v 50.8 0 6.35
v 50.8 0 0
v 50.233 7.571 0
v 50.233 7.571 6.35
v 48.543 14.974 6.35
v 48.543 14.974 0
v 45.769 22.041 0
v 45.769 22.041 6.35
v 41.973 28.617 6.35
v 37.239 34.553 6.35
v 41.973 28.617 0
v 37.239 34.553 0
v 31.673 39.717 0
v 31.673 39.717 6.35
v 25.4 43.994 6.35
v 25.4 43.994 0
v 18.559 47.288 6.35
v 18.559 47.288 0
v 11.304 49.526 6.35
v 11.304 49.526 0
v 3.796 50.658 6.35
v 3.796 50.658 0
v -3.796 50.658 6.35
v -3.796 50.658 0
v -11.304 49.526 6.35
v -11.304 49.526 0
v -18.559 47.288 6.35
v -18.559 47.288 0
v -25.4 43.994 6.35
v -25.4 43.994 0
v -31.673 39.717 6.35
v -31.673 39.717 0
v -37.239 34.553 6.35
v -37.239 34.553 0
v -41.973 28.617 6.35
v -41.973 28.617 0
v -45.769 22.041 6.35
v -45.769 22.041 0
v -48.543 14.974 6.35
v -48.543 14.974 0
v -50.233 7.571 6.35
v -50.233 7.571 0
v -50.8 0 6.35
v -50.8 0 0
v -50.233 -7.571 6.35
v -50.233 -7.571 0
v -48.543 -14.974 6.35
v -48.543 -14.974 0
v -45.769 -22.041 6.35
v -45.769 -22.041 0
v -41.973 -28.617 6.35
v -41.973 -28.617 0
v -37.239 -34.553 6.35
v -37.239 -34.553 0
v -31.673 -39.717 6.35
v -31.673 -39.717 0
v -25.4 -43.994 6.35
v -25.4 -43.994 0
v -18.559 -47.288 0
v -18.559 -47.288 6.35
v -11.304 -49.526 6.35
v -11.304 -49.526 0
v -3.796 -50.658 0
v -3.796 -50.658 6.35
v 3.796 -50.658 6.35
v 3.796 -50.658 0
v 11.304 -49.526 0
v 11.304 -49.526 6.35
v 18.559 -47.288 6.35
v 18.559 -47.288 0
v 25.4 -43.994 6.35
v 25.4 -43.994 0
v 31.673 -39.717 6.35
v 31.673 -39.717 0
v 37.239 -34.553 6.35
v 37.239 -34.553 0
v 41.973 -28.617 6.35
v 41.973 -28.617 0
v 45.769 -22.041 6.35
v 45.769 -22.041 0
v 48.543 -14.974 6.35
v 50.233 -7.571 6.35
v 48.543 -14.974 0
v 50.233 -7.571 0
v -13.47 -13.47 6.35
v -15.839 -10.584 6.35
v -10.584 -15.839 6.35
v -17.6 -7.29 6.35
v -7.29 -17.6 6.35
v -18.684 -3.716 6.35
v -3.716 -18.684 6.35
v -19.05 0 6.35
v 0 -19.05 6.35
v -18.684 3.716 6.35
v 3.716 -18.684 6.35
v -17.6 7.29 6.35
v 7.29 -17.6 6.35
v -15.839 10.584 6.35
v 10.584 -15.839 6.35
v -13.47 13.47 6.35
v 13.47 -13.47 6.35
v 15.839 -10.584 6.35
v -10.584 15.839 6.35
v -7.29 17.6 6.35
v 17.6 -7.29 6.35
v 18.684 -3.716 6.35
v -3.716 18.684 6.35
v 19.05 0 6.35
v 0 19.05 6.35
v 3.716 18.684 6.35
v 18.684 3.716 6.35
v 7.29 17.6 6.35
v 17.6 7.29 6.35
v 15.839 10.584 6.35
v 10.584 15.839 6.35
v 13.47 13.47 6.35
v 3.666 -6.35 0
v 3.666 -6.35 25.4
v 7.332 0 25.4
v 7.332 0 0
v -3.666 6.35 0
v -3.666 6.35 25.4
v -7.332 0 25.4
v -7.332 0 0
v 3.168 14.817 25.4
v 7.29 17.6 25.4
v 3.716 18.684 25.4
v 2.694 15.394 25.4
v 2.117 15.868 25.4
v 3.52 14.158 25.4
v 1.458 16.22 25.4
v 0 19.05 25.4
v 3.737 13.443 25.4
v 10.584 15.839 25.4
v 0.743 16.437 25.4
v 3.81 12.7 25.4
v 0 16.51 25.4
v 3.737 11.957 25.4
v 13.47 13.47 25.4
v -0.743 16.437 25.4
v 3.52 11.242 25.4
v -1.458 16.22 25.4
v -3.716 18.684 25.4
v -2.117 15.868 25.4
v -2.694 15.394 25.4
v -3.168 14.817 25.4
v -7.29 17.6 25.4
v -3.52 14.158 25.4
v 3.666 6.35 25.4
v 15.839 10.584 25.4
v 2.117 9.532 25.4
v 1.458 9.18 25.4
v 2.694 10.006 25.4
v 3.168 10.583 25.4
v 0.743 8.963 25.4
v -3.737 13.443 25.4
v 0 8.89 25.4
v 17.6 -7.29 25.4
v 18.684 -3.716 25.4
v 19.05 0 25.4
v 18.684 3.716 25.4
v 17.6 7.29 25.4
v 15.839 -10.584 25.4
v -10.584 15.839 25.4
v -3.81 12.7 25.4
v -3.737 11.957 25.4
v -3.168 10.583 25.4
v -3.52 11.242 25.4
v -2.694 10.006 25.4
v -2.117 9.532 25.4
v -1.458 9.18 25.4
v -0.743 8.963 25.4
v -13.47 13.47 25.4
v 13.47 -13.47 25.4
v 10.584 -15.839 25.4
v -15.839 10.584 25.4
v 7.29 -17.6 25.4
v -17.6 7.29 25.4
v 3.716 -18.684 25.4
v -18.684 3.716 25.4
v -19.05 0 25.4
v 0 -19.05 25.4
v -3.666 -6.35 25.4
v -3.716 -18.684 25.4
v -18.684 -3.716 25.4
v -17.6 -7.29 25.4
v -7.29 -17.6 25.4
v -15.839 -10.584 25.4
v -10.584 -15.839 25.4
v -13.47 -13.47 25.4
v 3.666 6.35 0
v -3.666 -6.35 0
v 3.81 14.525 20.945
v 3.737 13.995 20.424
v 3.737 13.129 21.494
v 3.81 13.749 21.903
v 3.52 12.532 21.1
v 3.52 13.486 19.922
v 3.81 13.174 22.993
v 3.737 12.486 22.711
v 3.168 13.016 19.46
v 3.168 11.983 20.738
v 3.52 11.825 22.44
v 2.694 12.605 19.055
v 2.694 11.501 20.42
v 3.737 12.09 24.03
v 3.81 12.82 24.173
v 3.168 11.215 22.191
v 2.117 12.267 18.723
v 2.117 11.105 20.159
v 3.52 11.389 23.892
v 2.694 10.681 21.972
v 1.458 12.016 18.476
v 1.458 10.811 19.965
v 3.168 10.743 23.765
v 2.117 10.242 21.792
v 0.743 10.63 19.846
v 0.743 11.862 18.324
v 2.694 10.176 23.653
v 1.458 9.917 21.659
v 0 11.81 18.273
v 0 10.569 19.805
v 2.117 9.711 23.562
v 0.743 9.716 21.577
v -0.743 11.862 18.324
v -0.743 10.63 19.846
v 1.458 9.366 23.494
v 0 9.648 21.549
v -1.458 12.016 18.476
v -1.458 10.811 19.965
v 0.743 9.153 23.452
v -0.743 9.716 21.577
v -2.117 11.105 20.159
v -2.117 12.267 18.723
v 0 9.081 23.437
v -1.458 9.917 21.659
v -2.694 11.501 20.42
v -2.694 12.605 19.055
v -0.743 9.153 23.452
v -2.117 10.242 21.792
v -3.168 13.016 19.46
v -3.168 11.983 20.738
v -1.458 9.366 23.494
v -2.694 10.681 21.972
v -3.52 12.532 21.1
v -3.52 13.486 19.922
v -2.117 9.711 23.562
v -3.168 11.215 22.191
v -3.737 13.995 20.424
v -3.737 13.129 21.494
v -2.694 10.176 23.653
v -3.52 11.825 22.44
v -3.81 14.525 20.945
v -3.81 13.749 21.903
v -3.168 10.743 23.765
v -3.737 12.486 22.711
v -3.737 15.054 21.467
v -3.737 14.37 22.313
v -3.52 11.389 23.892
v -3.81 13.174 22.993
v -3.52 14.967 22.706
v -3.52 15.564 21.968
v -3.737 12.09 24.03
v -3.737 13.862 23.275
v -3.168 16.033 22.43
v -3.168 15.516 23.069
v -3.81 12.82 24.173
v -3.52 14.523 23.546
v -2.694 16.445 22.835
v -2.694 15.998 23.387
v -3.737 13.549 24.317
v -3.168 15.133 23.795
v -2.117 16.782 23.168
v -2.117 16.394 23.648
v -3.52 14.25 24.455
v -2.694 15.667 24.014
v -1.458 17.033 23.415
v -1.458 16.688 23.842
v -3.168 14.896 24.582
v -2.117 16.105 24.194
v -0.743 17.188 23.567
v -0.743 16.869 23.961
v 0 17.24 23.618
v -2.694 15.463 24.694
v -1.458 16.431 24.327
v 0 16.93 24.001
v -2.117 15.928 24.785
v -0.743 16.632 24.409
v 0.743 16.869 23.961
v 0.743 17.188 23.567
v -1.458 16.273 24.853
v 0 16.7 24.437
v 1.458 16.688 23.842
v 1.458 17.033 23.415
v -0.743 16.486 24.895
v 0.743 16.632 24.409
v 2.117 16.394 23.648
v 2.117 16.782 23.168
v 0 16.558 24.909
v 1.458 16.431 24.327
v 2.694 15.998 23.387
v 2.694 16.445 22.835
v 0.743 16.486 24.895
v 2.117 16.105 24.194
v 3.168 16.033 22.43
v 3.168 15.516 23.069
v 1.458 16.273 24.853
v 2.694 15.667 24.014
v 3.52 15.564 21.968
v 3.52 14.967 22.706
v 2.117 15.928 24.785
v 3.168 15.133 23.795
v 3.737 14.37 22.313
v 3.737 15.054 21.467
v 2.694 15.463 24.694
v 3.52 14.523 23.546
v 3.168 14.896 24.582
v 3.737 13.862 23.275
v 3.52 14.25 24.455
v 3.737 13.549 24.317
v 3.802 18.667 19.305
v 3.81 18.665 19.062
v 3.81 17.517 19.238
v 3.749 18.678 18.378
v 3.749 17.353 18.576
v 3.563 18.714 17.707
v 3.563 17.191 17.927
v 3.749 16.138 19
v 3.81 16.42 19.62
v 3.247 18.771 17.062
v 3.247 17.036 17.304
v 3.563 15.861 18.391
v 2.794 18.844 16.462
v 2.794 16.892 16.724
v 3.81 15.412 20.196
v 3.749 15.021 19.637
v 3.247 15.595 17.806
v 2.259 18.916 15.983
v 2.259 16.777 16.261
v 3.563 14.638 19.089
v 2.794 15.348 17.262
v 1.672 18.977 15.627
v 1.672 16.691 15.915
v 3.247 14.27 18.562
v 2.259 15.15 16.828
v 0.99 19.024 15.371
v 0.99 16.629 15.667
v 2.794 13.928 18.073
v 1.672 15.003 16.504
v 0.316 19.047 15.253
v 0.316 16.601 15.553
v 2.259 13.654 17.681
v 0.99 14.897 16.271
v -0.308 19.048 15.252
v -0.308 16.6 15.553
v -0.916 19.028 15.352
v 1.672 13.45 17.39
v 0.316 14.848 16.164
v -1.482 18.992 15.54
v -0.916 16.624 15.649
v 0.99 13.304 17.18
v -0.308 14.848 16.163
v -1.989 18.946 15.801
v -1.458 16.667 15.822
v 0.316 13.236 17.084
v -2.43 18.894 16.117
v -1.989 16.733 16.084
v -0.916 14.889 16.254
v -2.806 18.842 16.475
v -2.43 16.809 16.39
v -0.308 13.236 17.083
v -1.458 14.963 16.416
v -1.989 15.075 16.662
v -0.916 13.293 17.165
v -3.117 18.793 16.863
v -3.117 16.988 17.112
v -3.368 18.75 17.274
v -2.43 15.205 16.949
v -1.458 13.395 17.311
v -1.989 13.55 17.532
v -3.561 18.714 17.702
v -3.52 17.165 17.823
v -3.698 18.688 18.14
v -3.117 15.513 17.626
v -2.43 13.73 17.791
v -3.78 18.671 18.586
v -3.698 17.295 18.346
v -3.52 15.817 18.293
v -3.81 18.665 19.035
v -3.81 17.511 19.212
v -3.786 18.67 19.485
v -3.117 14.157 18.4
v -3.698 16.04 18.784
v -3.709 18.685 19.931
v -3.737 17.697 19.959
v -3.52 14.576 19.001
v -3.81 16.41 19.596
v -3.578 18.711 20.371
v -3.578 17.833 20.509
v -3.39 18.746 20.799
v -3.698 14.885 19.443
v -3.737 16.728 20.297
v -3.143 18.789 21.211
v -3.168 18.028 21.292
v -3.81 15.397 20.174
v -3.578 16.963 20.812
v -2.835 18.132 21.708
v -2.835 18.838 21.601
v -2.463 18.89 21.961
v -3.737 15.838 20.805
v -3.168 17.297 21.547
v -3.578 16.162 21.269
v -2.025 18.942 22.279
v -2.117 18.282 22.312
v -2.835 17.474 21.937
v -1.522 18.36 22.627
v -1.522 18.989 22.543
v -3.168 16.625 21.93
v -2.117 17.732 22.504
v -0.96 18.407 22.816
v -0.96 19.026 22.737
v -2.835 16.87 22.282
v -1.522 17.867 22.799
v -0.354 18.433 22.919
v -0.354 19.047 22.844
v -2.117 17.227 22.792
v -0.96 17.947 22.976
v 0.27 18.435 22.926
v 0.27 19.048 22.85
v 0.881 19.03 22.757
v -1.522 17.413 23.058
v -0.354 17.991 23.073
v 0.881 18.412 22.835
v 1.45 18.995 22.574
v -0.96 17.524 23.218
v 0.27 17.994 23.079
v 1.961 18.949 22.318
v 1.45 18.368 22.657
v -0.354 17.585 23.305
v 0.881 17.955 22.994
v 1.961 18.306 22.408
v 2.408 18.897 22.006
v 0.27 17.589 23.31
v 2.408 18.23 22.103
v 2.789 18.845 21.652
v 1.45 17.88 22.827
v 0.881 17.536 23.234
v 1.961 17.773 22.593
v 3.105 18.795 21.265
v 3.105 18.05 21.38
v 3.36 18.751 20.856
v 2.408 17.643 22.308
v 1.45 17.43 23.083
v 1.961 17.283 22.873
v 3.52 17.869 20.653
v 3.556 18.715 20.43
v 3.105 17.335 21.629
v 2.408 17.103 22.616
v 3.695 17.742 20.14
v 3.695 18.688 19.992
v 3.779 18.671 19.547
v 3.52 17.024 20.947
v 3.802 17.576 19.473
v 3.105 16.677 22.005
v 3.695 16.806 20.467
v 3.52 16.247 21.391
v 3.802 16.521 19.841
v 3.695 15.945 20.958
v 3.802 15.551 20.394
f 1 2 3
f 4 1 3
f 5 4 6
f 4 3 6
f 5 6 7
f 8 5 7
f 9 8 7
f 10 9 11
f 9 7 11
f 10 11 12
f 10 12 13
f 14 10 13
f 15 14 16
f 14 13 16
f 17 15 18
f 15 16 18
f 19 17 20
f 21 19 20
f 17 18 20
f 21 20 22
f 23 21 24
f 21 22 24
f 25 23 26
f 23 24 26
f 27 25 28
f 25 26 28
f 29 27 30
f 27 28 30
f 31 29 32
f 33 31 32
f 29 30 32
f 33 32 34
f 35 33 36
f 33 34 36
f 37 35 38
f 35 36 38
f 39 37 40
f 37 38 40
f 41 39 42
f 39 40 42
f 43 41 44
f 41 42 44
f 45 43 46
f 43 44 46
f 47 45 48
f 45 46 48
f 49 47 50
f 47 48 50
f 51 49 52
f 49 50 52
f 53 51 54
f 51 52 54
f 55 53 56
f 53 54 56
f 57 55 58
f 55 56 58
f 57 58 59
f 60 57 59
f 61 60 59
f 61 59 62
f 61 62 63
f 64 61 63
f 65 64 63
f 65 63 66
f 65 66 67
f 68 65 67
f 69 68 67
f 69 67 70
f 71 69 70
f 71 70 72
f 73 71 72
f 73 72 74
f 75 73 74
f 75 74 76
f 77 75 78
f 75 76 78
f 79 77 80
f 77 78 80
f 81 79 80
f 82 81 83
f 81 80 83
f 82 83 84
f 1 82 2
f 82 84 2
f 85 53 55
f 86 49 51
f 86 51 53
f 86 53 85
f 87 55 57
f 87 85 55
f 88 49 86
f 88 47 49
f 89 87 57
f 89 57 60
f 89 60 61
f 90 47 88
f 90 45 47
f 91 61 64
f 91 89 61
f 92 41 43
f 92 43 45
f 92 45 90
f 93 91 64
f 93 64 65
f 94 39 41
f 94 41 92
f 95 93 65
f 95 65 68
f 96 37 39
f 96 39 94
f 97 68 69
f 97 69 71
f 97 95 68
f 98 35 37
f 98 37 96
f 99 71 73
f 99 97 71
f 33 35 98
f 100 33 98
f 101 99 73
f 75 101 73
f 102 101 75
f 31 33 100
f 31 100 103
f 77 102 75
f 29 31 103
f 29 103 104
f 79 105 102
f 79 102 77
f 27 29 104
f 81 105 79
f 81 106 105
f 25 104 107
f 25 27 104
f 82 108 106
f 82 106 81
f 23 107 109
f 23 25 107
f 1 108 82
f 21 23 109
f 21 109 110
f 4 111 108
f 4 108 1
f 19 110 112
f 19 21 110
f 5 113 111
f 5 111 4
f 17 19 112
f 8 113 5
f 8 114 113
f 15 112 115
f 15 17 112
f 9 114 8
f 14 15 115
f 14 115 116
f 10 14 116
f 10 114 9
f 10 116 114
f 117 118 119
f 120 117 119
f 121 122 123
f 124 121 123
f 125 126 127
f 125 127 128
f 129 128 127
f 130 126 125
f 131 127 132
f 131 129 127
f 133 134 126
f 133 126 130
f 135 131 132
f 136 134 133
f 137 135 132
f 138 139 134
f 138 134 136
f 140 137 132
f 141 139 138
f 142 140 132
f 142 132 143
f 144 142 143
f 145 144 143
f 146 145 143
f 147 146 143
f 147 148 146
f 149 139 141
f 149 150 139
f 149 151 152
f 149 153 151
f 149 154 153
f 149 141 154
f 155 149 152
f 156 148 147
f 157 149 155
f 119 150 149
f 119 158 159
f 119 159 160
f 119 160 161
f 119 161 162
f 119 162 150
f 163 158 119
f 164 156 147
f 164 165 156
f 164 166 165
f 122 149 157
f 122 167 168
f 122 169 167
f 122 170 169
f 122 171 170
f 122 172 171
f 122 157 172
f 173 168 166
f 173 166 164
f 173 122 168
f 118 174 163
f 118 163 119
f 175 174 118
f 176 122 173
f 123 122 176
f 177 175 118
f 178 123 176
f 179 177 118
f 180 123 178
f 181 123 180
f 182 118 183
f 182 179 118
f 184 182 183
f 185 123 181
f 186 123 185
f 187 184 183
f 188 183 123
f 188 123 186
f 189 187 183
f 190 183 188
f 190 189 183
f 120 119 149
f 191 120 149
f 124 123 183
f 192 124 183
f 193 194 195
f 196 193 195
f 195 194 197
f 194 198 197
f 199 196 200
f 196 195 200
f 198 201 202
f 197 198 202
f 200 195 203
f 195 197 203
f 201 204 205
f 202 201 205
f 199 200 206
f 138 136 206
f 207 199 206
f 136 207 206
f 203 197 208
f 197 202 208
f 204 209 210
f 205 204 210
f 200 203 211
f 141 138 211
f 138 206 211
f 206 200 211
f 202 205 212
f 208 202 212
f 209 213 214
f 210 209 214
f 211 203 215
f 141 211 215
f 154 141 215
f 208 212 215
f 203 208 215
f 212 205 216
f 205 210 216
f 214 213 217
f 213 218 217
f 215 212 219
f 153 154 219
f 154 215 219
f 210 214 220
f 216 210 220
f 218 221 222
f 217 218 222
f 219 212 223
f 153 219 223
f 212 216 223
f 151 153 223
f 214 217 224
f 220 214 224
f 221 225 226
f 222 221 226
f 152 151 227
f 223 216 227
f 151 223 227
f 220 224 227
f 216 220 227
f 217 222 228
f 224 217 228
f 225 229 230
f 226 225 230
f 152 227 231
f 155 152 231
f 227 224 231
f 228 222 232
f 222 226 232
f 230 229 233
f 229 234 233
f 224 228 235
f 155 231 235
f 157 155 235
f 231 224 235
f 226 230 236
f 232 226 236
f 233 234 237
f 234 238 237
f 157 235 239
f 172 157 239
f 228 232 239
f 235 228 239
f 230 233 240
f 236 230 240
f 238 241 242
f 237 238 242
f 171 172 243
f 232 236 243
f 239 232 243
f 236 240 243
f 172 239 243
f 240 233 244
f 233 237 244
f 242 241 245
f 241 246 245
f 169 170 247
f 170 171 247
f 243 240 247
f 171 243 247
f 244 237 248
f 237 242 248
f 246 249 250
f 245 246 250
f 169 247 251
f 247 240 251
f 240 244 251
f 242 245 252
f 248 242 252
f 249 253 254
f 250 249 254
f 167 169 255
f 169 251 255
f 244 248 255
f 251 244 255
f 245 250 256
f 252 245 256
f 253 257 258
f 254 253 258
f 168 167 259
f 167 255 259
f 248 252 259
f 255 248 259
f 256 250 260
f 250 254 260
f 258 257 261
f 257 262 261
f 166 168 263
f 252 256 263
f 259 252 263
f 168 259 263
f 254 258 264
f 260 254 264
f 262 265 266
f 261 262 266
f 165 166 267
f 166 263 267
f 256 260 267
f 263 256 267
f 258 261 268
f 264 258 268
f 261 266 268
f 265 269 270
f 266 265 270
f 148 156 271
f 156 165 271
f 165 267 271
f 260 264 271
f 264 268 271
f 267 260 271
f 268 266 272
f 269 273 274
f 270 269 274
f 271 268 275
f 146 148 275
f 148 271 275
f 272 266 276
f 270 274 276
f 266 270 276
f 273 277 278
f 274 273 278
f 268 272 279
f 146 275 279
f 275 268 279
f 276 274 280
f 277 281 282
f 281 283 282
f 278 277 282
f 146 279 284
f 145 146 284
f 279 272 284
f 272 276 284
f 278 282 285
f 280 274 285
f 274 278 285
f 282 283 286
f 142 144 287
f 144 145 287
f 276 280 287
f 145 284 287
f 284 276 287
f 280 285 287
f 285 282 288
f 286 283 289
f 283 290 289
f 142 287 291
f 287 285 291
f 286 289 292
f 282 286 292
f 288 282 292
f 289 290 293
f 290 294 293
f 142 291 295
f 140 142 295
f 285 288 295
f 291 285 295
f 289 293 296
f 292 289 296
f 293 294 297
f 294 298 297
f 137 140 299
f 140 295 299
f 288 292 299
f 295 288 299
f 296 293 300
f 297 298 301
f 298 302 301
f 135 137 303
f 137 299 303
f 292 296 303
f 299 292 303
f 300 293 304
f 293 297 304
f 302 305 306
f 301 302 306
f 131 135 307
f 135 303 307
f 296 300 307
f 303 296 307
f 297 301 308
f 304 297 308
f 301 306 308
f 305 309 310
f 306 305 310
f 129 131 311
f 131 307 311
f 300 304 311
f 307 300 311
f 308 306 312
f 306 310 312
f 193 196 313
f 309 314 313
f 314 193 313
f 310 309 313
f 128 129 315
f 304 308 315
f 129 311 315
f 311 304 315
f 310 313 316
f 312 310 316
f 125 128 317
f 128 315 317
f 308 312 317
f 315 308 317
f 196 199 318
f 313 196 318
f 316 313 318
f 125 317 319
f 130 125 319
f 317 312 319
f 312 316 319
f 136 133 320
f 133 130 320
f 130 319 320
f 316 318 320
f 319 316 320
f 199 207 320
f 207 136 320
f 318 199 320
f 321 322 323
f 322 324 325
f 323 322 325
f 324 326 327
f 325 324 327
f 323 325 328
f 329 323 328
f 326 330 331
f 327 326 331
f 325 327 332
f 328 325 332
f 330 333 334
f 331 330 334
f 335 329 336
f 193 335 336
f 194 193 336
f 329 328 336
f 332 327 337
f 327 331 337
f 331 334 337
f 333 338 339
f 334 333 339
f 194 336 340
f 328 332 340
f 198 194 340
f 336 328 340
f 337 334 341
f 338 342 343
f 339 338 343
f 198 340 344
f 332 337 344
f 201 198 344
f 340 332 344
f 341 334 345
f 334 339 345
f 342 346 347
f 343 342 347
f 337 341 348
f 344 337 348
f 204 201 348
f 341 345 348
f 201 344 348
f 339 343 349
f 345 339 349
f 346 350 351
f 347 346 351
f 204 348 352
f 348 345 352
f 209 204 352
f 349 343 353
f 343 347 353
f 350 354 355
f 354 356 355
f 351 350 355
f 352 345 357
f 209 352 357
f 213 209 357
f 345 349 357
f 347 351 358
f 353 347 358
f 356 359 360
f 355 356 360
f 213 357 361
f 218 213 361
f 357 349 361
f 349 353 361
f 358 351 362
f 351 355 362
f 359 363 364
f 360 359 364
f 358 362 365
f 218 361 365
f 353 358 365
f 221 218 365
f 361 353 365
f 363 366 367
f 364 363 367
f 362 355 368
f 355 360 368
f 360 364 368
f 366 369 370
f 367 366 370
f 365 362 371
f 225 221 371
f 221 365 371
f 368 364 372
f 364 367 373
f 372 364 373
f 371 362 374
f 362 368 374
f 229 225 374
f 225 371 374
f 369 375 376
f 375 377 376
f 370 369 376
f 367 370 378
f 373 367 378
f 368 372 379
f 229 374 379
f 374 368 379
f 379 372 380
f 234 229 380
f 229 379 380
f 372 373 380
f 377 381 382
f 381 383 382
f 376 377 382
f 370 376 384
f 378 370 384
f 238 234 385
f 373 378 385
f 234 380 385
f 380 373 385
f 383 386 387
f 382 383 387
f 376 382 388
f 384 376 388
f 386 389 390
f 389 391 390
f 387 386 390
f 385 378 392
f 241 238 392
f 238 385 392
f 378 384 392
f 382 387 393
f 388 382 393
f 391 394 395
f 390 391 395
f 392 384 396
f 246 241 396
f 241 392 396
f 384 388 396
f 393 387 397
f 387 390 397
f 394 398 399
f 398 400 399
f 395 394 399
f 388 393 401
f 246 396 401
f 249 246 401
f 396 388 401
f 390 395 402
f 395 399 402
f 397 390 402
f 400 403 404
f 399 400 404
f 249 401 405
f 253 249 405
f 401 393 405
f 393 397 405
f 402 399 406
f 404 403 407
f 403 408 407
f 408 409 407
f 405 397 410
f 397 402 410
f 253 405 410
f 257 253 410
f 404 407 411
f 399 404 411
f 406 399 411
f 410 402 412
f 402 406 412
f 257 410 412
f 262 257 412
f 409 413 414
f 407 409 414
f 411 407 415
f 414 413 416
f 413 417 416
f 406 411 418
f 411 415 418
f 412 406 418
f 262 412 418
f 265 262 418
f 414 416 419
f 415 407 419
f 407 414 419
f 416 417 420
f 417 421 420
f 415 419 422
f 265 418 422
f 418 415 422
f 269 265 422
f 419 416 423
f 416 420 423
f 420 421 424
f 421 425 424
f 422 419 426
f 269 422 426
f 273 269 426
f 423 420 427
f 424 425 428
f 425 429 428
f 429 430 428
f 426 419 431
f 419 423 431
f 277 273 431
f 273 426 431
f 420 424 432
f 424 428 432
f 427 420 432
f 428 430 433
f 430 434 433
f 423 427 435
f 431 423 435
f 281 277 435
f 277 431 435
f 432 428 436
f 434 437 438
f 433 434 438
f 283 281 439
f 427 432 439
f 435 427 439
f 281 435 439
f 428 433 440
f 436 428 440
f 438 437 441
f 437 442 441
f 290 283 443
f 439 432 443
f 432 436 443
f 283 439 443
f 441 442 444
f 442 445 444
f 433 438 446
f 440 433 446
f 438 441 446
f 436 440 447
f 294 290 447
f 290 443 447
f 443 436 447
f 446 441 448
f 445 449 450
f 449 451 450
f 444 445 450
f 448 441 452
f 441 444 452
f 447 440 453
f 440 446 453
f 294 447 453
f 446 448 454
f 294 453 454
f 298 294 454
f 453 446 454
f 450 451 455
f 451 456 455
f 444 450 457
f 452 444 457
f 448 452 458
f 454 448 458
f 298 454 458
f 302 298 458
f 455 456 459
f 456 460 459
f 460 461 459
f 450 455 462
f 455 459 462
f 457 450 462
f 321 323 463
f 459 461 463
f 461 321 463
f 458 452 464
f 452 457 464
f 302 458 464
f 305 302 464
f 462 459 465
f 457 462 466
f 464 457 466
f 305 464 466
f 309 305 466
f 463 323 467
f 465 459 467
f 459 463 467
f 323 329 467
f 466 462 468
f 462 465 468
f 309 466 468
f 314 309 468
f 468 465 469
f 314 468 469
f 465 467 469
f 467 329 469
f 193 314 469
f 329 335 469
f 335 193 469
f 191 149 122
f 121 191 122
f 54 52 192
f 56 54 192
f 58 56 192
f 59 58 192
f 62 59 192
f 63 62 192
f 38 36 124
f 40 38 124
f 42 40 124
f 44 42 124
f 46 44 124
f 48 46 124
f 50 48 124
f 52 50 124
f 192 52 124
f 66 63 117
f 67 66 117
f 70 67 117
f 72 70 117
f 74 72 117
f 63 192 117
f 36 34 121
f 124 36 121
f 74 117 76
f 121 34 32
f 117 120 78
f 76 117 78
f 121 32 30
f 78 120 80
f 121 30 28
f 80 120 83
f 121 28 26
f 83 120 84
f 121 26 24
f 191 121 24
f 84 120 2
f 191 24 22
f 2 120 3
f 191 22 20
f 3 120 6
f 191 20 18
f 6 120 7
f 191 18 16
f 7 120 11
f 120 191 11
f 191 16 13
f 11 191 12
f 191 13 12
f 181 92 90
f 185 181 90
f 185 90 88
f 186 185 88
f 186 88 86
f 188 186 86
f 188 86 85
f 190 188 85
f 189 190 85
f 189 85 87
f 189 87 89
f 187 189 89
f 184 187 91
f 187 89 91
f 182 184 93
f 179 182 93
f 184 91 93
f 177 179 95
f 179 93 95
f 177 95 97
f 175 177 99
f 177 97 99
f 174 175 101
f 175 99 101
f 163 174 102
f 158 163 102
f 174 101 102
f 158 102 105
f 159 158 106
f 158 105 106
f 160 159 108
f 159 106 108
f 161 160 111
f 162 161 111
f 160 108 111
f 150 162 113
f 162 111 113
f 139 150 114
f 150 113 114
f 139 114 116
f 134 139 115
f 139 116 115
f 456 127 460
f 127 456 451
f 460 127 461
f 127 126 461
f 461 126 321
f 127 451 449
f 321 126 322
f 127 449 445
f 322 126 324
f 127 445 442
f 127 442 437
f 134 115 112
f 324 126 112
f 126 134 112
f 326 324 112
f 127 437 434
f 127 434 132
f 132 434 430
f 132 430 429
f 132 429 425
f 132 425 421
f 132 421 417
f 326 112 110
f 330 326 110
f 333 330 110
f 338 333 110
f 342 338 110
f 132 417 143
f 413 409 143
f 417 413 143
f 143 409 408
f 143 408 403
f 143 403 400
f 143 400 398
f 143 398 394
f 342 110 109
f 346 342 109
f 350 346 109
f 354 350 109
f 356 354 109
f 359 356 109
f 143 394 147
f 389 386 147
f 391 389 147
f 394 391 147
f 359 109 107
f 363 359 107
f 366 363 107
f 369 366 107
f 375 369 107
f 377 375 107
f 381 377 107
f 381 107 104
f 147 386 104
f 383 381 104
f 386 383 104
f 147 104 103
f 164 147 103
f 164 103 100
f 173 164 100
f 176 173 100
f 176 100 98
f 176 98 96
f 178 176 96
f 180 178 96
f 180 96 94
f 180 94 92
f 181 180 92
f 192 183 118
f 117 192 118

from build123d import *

# Parameters (mm, degrees)
SKETCH1_R           = 50.8
BOSS_EXTRUDE1_DEPTH = 6.35
SKETCH2_R           = 19.05
BOSS_EXTRUDE2_DEPTH = 19.05
CUT_EXTRUDE1_DEPTH  = 25.4
SKETCH4_R           = 3.81


with BuildPart() as part:
    # Sketch1 → Boss-Extrude1 (new body)
    with BuildSketch(Plane.XY):
        Circle(SKETCH1_R)
    extrude(amount=BOSS_EXTRUDE1_DEPTH)

    # Sketch2 → Boss-Extrude2 (add)
    with BuildSketch(Plane.XY.offset(6.35)):
        with Locations(Location((0, 0, 0), (0, 0, 180))):
            Circle(SKETCH2_R)
    extrude(amount=BOSS_EXTRUDE2_DEPTH)

    # Sketch3 → Cut-Extrude1 (cut)
    with BuildSketch(Plane.XY.offset(25.4)):
        Polygon((7.332348419, 0), (3.666174209, 6.35), (-3.666174209, 6.35), (-7.332348419, 0), (-3.666174209, -6.35), (3.666174209, -6.35), align=None)
    extrude(amount=-CUT_EXTRUDE1_DEPTH, mode=Mode.SUBTRACT)

    # Sketch4 → Cut-Revolve1 (revolve, cut)
    with BuildSketch(Plane(origin=(0, 19.05, 0), x_dir=(1, 0, 0), z_dir=(0, 1, 0)), mode=Mode.PRIVATE) as cut_revolve1_sk:
        with Locations((0, -19.05)):
            Circle(SKETCH4_R)
    revolve(cut_revolve1_sk.sketch.rotate(Axis((25.4, 19.05, 25.4), (-1, 0, 0)), 45.450641154), axis=Axis((25.4, 19.05, 25.4), (-1, 0, 0)), mode=Mode.SUBTRACT)


solid = part.part
